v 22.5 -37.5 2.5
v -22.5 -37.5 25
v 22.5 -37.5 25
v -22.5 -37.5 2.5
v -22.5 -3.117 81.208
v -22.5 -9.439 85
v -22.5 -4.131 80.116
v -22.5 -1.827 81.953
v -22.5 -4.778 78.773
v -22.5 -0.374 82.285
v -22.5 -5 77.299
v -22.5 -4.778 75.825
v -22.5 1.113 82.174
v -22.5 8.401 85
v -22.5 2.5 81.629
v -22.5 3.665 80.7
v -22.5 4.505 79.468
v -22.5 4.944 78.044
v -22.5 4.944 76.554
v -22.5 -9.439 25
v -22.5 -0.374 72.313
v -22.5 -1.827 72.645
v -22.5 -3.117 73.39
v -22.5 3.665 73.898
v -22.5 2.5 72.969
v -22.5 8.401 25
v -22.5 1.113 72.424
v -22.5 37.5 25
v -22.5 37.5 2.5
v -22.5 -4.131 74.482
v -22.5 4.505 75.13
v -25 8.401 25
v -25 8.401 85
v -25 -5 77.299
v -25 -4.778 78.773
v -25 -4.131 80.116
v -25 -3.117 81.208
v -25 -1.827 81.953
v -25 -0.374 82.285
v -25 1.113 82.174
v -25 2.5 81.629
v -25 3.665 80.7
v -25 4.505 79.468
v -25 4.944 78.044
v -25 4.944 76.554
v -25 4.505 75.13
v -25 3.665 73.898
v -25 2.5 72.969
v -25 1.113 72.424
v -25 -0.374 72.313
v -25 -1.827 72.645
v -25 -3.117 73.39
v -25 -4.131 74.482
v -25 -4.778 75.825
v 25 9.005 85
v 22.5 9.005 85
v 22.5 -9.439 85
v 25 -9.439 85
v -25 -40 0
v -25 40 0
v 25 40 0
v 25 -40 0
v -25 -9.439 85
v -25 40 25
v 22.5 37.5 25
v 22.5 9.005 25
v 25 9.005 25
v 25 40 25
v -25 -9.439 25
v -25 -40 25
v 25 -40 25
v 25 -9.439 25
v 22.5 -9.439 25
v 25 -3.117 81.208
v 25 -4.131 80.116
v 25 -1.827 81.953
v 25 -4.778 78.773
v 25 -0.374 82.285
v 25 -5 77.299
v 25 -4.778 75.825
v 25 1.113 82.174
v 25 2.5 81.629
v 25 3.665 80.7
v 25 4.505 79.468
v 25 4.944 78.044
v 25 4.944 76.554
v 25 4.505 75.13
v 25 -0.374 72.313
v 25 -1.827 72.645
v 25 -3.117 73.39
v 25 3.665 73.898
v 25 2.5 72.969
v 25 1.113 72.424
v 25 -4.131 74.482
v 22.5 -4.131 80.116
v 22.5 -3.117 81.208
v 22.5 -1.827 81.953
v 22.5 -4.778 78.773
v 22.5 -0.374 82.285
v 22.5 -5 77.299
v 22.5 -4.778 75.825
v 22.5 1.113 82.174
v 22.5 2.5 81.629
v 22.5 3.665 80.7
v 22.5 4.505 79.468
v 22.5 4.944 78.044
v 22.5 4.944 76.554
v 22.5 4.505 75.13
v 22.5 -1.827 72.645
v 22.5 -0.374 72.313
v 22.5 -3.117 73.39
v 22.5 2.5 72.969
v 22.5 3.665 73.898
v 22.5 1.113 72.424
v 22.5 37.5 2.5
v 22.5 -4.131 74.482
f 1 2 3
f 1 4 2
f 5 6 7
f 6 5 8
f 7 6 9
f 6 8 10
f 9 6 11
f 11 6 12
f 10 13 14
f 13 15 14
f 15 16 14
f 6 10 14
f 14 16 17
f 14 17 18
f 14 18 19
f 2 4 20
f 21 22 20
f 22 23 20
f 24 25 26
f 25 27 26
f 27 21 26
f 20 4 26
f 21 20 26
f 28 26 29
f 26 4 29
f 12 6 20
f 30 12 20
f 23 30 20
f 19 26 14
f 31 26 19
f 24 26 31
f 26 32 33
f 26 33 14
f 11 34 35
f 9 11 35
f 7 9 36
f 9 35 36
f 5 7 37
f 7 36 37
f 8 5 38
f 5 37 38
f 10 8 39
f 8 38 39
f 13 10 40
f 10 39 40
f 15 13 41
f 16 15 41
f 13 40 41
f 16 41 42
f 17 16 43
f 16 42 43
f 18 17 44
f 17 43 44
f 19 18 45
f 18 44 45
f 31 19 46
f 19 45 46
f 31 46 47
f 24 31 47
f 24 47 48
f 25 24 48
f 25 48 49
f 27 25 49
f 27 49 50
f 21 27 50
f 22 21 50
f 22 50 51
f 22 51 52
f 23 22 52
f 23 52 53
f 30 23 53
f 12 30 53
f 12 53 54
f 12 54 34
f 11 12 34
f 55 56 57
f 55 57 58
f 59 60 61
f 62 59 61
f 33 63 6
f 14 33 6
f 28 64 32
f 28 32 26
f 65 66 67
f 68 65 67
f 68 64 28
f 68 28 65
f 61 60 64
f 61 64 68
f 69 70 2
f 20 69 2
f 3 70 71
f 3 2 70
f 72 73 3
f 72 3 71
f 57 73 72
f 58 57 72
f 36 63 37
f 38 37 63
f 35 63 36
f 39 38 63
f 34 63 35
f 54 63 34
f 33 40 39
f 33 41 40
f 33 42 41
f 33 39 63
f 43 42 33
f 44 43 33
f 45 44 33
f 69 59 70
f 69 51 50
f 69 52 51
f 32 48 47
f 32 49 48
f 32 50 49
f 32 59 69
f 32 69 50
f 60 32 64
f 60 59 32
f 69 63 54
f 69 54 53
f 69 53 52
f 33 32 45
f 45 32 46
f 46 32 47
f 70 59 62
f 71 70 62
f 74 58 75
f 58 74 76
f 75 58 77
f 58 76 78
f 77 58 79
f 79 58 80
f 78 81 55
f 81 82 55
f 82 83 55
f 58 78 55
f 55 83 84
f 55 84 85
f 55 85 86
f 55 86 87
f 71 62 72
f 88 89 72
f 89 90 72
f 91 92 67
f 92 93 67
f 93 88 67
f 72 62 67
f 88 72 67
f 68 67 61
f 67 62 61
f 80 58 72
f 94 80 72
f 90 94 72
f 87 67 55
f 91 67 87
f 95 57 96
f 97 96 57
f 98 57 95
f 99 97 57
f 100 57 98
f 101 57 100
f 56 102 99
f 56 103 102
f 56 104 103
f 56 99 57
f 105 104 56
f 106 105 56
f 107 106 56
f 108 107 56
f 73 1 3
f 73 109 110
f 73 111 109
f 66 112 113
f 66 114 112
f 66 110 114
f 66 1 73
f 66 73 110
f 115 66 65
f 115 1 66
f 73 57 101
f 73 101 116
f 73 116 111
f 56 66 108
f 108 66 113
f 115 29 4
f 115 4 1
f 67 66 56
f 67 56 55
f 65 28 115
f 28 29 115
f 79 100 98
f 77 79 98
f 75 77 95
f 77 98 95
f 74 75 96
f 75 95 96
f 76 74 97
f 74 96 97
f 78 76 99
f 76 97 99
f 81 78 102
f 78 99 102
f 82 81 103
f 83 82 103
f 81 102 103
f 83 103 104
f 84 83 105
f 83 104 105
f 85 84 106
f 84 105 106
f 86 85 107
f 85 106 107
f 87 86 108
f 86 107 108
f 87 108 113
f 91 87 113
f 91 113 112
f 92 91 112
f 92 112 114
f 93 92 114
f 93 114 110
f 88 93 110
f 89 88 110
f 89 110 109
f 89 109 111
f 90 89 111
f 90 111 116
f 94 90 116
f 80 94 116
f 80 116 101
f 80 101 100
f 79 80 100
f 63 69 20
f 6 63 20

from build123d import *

# Parameters (mm, degrees)
F0_W     = 50
F0_H     = 80
F1_DEPTH = 25
F2_T     = -2.5
F3_W     = 2.5
F3_H     = 17.840053
F3_H_2   = 18.443981
F4_DEPTH = 60
F6_D     = 10


with BuildPart() as f1:
    # F0 (on Top) → F1 (new body)
    with BuildSketch(Plane.XY):
        Rectangle(F0_W, F0_H)
    extrude(amount=F1_DEPTH)

    # F2
    f2_openings = [f1.faces().sort_by_distance(p)[0] for p in [
        (0, 0, 25),
    ]]
    offset(amount=F2_T, openings=f2_openings)

    # F3 (on face) → F4 (join)
    with BuildSketch(Plane.XY.offset(25)):
        with Locations((-23.75, -0.518573)):
            Rectangle(F3_W, F3_H)
        with Locations((23.75, -0.216609)):
            Rectangle(F3_W, F3_H_2)
    extrude(amount=F4_DEPTH)

    # F6 (through all)
    with Locations(Plane.YZ.offset(25)):
        with Locations((0, 77.299073)):
            Hole(F6_D / 2)


solid = f1.part
